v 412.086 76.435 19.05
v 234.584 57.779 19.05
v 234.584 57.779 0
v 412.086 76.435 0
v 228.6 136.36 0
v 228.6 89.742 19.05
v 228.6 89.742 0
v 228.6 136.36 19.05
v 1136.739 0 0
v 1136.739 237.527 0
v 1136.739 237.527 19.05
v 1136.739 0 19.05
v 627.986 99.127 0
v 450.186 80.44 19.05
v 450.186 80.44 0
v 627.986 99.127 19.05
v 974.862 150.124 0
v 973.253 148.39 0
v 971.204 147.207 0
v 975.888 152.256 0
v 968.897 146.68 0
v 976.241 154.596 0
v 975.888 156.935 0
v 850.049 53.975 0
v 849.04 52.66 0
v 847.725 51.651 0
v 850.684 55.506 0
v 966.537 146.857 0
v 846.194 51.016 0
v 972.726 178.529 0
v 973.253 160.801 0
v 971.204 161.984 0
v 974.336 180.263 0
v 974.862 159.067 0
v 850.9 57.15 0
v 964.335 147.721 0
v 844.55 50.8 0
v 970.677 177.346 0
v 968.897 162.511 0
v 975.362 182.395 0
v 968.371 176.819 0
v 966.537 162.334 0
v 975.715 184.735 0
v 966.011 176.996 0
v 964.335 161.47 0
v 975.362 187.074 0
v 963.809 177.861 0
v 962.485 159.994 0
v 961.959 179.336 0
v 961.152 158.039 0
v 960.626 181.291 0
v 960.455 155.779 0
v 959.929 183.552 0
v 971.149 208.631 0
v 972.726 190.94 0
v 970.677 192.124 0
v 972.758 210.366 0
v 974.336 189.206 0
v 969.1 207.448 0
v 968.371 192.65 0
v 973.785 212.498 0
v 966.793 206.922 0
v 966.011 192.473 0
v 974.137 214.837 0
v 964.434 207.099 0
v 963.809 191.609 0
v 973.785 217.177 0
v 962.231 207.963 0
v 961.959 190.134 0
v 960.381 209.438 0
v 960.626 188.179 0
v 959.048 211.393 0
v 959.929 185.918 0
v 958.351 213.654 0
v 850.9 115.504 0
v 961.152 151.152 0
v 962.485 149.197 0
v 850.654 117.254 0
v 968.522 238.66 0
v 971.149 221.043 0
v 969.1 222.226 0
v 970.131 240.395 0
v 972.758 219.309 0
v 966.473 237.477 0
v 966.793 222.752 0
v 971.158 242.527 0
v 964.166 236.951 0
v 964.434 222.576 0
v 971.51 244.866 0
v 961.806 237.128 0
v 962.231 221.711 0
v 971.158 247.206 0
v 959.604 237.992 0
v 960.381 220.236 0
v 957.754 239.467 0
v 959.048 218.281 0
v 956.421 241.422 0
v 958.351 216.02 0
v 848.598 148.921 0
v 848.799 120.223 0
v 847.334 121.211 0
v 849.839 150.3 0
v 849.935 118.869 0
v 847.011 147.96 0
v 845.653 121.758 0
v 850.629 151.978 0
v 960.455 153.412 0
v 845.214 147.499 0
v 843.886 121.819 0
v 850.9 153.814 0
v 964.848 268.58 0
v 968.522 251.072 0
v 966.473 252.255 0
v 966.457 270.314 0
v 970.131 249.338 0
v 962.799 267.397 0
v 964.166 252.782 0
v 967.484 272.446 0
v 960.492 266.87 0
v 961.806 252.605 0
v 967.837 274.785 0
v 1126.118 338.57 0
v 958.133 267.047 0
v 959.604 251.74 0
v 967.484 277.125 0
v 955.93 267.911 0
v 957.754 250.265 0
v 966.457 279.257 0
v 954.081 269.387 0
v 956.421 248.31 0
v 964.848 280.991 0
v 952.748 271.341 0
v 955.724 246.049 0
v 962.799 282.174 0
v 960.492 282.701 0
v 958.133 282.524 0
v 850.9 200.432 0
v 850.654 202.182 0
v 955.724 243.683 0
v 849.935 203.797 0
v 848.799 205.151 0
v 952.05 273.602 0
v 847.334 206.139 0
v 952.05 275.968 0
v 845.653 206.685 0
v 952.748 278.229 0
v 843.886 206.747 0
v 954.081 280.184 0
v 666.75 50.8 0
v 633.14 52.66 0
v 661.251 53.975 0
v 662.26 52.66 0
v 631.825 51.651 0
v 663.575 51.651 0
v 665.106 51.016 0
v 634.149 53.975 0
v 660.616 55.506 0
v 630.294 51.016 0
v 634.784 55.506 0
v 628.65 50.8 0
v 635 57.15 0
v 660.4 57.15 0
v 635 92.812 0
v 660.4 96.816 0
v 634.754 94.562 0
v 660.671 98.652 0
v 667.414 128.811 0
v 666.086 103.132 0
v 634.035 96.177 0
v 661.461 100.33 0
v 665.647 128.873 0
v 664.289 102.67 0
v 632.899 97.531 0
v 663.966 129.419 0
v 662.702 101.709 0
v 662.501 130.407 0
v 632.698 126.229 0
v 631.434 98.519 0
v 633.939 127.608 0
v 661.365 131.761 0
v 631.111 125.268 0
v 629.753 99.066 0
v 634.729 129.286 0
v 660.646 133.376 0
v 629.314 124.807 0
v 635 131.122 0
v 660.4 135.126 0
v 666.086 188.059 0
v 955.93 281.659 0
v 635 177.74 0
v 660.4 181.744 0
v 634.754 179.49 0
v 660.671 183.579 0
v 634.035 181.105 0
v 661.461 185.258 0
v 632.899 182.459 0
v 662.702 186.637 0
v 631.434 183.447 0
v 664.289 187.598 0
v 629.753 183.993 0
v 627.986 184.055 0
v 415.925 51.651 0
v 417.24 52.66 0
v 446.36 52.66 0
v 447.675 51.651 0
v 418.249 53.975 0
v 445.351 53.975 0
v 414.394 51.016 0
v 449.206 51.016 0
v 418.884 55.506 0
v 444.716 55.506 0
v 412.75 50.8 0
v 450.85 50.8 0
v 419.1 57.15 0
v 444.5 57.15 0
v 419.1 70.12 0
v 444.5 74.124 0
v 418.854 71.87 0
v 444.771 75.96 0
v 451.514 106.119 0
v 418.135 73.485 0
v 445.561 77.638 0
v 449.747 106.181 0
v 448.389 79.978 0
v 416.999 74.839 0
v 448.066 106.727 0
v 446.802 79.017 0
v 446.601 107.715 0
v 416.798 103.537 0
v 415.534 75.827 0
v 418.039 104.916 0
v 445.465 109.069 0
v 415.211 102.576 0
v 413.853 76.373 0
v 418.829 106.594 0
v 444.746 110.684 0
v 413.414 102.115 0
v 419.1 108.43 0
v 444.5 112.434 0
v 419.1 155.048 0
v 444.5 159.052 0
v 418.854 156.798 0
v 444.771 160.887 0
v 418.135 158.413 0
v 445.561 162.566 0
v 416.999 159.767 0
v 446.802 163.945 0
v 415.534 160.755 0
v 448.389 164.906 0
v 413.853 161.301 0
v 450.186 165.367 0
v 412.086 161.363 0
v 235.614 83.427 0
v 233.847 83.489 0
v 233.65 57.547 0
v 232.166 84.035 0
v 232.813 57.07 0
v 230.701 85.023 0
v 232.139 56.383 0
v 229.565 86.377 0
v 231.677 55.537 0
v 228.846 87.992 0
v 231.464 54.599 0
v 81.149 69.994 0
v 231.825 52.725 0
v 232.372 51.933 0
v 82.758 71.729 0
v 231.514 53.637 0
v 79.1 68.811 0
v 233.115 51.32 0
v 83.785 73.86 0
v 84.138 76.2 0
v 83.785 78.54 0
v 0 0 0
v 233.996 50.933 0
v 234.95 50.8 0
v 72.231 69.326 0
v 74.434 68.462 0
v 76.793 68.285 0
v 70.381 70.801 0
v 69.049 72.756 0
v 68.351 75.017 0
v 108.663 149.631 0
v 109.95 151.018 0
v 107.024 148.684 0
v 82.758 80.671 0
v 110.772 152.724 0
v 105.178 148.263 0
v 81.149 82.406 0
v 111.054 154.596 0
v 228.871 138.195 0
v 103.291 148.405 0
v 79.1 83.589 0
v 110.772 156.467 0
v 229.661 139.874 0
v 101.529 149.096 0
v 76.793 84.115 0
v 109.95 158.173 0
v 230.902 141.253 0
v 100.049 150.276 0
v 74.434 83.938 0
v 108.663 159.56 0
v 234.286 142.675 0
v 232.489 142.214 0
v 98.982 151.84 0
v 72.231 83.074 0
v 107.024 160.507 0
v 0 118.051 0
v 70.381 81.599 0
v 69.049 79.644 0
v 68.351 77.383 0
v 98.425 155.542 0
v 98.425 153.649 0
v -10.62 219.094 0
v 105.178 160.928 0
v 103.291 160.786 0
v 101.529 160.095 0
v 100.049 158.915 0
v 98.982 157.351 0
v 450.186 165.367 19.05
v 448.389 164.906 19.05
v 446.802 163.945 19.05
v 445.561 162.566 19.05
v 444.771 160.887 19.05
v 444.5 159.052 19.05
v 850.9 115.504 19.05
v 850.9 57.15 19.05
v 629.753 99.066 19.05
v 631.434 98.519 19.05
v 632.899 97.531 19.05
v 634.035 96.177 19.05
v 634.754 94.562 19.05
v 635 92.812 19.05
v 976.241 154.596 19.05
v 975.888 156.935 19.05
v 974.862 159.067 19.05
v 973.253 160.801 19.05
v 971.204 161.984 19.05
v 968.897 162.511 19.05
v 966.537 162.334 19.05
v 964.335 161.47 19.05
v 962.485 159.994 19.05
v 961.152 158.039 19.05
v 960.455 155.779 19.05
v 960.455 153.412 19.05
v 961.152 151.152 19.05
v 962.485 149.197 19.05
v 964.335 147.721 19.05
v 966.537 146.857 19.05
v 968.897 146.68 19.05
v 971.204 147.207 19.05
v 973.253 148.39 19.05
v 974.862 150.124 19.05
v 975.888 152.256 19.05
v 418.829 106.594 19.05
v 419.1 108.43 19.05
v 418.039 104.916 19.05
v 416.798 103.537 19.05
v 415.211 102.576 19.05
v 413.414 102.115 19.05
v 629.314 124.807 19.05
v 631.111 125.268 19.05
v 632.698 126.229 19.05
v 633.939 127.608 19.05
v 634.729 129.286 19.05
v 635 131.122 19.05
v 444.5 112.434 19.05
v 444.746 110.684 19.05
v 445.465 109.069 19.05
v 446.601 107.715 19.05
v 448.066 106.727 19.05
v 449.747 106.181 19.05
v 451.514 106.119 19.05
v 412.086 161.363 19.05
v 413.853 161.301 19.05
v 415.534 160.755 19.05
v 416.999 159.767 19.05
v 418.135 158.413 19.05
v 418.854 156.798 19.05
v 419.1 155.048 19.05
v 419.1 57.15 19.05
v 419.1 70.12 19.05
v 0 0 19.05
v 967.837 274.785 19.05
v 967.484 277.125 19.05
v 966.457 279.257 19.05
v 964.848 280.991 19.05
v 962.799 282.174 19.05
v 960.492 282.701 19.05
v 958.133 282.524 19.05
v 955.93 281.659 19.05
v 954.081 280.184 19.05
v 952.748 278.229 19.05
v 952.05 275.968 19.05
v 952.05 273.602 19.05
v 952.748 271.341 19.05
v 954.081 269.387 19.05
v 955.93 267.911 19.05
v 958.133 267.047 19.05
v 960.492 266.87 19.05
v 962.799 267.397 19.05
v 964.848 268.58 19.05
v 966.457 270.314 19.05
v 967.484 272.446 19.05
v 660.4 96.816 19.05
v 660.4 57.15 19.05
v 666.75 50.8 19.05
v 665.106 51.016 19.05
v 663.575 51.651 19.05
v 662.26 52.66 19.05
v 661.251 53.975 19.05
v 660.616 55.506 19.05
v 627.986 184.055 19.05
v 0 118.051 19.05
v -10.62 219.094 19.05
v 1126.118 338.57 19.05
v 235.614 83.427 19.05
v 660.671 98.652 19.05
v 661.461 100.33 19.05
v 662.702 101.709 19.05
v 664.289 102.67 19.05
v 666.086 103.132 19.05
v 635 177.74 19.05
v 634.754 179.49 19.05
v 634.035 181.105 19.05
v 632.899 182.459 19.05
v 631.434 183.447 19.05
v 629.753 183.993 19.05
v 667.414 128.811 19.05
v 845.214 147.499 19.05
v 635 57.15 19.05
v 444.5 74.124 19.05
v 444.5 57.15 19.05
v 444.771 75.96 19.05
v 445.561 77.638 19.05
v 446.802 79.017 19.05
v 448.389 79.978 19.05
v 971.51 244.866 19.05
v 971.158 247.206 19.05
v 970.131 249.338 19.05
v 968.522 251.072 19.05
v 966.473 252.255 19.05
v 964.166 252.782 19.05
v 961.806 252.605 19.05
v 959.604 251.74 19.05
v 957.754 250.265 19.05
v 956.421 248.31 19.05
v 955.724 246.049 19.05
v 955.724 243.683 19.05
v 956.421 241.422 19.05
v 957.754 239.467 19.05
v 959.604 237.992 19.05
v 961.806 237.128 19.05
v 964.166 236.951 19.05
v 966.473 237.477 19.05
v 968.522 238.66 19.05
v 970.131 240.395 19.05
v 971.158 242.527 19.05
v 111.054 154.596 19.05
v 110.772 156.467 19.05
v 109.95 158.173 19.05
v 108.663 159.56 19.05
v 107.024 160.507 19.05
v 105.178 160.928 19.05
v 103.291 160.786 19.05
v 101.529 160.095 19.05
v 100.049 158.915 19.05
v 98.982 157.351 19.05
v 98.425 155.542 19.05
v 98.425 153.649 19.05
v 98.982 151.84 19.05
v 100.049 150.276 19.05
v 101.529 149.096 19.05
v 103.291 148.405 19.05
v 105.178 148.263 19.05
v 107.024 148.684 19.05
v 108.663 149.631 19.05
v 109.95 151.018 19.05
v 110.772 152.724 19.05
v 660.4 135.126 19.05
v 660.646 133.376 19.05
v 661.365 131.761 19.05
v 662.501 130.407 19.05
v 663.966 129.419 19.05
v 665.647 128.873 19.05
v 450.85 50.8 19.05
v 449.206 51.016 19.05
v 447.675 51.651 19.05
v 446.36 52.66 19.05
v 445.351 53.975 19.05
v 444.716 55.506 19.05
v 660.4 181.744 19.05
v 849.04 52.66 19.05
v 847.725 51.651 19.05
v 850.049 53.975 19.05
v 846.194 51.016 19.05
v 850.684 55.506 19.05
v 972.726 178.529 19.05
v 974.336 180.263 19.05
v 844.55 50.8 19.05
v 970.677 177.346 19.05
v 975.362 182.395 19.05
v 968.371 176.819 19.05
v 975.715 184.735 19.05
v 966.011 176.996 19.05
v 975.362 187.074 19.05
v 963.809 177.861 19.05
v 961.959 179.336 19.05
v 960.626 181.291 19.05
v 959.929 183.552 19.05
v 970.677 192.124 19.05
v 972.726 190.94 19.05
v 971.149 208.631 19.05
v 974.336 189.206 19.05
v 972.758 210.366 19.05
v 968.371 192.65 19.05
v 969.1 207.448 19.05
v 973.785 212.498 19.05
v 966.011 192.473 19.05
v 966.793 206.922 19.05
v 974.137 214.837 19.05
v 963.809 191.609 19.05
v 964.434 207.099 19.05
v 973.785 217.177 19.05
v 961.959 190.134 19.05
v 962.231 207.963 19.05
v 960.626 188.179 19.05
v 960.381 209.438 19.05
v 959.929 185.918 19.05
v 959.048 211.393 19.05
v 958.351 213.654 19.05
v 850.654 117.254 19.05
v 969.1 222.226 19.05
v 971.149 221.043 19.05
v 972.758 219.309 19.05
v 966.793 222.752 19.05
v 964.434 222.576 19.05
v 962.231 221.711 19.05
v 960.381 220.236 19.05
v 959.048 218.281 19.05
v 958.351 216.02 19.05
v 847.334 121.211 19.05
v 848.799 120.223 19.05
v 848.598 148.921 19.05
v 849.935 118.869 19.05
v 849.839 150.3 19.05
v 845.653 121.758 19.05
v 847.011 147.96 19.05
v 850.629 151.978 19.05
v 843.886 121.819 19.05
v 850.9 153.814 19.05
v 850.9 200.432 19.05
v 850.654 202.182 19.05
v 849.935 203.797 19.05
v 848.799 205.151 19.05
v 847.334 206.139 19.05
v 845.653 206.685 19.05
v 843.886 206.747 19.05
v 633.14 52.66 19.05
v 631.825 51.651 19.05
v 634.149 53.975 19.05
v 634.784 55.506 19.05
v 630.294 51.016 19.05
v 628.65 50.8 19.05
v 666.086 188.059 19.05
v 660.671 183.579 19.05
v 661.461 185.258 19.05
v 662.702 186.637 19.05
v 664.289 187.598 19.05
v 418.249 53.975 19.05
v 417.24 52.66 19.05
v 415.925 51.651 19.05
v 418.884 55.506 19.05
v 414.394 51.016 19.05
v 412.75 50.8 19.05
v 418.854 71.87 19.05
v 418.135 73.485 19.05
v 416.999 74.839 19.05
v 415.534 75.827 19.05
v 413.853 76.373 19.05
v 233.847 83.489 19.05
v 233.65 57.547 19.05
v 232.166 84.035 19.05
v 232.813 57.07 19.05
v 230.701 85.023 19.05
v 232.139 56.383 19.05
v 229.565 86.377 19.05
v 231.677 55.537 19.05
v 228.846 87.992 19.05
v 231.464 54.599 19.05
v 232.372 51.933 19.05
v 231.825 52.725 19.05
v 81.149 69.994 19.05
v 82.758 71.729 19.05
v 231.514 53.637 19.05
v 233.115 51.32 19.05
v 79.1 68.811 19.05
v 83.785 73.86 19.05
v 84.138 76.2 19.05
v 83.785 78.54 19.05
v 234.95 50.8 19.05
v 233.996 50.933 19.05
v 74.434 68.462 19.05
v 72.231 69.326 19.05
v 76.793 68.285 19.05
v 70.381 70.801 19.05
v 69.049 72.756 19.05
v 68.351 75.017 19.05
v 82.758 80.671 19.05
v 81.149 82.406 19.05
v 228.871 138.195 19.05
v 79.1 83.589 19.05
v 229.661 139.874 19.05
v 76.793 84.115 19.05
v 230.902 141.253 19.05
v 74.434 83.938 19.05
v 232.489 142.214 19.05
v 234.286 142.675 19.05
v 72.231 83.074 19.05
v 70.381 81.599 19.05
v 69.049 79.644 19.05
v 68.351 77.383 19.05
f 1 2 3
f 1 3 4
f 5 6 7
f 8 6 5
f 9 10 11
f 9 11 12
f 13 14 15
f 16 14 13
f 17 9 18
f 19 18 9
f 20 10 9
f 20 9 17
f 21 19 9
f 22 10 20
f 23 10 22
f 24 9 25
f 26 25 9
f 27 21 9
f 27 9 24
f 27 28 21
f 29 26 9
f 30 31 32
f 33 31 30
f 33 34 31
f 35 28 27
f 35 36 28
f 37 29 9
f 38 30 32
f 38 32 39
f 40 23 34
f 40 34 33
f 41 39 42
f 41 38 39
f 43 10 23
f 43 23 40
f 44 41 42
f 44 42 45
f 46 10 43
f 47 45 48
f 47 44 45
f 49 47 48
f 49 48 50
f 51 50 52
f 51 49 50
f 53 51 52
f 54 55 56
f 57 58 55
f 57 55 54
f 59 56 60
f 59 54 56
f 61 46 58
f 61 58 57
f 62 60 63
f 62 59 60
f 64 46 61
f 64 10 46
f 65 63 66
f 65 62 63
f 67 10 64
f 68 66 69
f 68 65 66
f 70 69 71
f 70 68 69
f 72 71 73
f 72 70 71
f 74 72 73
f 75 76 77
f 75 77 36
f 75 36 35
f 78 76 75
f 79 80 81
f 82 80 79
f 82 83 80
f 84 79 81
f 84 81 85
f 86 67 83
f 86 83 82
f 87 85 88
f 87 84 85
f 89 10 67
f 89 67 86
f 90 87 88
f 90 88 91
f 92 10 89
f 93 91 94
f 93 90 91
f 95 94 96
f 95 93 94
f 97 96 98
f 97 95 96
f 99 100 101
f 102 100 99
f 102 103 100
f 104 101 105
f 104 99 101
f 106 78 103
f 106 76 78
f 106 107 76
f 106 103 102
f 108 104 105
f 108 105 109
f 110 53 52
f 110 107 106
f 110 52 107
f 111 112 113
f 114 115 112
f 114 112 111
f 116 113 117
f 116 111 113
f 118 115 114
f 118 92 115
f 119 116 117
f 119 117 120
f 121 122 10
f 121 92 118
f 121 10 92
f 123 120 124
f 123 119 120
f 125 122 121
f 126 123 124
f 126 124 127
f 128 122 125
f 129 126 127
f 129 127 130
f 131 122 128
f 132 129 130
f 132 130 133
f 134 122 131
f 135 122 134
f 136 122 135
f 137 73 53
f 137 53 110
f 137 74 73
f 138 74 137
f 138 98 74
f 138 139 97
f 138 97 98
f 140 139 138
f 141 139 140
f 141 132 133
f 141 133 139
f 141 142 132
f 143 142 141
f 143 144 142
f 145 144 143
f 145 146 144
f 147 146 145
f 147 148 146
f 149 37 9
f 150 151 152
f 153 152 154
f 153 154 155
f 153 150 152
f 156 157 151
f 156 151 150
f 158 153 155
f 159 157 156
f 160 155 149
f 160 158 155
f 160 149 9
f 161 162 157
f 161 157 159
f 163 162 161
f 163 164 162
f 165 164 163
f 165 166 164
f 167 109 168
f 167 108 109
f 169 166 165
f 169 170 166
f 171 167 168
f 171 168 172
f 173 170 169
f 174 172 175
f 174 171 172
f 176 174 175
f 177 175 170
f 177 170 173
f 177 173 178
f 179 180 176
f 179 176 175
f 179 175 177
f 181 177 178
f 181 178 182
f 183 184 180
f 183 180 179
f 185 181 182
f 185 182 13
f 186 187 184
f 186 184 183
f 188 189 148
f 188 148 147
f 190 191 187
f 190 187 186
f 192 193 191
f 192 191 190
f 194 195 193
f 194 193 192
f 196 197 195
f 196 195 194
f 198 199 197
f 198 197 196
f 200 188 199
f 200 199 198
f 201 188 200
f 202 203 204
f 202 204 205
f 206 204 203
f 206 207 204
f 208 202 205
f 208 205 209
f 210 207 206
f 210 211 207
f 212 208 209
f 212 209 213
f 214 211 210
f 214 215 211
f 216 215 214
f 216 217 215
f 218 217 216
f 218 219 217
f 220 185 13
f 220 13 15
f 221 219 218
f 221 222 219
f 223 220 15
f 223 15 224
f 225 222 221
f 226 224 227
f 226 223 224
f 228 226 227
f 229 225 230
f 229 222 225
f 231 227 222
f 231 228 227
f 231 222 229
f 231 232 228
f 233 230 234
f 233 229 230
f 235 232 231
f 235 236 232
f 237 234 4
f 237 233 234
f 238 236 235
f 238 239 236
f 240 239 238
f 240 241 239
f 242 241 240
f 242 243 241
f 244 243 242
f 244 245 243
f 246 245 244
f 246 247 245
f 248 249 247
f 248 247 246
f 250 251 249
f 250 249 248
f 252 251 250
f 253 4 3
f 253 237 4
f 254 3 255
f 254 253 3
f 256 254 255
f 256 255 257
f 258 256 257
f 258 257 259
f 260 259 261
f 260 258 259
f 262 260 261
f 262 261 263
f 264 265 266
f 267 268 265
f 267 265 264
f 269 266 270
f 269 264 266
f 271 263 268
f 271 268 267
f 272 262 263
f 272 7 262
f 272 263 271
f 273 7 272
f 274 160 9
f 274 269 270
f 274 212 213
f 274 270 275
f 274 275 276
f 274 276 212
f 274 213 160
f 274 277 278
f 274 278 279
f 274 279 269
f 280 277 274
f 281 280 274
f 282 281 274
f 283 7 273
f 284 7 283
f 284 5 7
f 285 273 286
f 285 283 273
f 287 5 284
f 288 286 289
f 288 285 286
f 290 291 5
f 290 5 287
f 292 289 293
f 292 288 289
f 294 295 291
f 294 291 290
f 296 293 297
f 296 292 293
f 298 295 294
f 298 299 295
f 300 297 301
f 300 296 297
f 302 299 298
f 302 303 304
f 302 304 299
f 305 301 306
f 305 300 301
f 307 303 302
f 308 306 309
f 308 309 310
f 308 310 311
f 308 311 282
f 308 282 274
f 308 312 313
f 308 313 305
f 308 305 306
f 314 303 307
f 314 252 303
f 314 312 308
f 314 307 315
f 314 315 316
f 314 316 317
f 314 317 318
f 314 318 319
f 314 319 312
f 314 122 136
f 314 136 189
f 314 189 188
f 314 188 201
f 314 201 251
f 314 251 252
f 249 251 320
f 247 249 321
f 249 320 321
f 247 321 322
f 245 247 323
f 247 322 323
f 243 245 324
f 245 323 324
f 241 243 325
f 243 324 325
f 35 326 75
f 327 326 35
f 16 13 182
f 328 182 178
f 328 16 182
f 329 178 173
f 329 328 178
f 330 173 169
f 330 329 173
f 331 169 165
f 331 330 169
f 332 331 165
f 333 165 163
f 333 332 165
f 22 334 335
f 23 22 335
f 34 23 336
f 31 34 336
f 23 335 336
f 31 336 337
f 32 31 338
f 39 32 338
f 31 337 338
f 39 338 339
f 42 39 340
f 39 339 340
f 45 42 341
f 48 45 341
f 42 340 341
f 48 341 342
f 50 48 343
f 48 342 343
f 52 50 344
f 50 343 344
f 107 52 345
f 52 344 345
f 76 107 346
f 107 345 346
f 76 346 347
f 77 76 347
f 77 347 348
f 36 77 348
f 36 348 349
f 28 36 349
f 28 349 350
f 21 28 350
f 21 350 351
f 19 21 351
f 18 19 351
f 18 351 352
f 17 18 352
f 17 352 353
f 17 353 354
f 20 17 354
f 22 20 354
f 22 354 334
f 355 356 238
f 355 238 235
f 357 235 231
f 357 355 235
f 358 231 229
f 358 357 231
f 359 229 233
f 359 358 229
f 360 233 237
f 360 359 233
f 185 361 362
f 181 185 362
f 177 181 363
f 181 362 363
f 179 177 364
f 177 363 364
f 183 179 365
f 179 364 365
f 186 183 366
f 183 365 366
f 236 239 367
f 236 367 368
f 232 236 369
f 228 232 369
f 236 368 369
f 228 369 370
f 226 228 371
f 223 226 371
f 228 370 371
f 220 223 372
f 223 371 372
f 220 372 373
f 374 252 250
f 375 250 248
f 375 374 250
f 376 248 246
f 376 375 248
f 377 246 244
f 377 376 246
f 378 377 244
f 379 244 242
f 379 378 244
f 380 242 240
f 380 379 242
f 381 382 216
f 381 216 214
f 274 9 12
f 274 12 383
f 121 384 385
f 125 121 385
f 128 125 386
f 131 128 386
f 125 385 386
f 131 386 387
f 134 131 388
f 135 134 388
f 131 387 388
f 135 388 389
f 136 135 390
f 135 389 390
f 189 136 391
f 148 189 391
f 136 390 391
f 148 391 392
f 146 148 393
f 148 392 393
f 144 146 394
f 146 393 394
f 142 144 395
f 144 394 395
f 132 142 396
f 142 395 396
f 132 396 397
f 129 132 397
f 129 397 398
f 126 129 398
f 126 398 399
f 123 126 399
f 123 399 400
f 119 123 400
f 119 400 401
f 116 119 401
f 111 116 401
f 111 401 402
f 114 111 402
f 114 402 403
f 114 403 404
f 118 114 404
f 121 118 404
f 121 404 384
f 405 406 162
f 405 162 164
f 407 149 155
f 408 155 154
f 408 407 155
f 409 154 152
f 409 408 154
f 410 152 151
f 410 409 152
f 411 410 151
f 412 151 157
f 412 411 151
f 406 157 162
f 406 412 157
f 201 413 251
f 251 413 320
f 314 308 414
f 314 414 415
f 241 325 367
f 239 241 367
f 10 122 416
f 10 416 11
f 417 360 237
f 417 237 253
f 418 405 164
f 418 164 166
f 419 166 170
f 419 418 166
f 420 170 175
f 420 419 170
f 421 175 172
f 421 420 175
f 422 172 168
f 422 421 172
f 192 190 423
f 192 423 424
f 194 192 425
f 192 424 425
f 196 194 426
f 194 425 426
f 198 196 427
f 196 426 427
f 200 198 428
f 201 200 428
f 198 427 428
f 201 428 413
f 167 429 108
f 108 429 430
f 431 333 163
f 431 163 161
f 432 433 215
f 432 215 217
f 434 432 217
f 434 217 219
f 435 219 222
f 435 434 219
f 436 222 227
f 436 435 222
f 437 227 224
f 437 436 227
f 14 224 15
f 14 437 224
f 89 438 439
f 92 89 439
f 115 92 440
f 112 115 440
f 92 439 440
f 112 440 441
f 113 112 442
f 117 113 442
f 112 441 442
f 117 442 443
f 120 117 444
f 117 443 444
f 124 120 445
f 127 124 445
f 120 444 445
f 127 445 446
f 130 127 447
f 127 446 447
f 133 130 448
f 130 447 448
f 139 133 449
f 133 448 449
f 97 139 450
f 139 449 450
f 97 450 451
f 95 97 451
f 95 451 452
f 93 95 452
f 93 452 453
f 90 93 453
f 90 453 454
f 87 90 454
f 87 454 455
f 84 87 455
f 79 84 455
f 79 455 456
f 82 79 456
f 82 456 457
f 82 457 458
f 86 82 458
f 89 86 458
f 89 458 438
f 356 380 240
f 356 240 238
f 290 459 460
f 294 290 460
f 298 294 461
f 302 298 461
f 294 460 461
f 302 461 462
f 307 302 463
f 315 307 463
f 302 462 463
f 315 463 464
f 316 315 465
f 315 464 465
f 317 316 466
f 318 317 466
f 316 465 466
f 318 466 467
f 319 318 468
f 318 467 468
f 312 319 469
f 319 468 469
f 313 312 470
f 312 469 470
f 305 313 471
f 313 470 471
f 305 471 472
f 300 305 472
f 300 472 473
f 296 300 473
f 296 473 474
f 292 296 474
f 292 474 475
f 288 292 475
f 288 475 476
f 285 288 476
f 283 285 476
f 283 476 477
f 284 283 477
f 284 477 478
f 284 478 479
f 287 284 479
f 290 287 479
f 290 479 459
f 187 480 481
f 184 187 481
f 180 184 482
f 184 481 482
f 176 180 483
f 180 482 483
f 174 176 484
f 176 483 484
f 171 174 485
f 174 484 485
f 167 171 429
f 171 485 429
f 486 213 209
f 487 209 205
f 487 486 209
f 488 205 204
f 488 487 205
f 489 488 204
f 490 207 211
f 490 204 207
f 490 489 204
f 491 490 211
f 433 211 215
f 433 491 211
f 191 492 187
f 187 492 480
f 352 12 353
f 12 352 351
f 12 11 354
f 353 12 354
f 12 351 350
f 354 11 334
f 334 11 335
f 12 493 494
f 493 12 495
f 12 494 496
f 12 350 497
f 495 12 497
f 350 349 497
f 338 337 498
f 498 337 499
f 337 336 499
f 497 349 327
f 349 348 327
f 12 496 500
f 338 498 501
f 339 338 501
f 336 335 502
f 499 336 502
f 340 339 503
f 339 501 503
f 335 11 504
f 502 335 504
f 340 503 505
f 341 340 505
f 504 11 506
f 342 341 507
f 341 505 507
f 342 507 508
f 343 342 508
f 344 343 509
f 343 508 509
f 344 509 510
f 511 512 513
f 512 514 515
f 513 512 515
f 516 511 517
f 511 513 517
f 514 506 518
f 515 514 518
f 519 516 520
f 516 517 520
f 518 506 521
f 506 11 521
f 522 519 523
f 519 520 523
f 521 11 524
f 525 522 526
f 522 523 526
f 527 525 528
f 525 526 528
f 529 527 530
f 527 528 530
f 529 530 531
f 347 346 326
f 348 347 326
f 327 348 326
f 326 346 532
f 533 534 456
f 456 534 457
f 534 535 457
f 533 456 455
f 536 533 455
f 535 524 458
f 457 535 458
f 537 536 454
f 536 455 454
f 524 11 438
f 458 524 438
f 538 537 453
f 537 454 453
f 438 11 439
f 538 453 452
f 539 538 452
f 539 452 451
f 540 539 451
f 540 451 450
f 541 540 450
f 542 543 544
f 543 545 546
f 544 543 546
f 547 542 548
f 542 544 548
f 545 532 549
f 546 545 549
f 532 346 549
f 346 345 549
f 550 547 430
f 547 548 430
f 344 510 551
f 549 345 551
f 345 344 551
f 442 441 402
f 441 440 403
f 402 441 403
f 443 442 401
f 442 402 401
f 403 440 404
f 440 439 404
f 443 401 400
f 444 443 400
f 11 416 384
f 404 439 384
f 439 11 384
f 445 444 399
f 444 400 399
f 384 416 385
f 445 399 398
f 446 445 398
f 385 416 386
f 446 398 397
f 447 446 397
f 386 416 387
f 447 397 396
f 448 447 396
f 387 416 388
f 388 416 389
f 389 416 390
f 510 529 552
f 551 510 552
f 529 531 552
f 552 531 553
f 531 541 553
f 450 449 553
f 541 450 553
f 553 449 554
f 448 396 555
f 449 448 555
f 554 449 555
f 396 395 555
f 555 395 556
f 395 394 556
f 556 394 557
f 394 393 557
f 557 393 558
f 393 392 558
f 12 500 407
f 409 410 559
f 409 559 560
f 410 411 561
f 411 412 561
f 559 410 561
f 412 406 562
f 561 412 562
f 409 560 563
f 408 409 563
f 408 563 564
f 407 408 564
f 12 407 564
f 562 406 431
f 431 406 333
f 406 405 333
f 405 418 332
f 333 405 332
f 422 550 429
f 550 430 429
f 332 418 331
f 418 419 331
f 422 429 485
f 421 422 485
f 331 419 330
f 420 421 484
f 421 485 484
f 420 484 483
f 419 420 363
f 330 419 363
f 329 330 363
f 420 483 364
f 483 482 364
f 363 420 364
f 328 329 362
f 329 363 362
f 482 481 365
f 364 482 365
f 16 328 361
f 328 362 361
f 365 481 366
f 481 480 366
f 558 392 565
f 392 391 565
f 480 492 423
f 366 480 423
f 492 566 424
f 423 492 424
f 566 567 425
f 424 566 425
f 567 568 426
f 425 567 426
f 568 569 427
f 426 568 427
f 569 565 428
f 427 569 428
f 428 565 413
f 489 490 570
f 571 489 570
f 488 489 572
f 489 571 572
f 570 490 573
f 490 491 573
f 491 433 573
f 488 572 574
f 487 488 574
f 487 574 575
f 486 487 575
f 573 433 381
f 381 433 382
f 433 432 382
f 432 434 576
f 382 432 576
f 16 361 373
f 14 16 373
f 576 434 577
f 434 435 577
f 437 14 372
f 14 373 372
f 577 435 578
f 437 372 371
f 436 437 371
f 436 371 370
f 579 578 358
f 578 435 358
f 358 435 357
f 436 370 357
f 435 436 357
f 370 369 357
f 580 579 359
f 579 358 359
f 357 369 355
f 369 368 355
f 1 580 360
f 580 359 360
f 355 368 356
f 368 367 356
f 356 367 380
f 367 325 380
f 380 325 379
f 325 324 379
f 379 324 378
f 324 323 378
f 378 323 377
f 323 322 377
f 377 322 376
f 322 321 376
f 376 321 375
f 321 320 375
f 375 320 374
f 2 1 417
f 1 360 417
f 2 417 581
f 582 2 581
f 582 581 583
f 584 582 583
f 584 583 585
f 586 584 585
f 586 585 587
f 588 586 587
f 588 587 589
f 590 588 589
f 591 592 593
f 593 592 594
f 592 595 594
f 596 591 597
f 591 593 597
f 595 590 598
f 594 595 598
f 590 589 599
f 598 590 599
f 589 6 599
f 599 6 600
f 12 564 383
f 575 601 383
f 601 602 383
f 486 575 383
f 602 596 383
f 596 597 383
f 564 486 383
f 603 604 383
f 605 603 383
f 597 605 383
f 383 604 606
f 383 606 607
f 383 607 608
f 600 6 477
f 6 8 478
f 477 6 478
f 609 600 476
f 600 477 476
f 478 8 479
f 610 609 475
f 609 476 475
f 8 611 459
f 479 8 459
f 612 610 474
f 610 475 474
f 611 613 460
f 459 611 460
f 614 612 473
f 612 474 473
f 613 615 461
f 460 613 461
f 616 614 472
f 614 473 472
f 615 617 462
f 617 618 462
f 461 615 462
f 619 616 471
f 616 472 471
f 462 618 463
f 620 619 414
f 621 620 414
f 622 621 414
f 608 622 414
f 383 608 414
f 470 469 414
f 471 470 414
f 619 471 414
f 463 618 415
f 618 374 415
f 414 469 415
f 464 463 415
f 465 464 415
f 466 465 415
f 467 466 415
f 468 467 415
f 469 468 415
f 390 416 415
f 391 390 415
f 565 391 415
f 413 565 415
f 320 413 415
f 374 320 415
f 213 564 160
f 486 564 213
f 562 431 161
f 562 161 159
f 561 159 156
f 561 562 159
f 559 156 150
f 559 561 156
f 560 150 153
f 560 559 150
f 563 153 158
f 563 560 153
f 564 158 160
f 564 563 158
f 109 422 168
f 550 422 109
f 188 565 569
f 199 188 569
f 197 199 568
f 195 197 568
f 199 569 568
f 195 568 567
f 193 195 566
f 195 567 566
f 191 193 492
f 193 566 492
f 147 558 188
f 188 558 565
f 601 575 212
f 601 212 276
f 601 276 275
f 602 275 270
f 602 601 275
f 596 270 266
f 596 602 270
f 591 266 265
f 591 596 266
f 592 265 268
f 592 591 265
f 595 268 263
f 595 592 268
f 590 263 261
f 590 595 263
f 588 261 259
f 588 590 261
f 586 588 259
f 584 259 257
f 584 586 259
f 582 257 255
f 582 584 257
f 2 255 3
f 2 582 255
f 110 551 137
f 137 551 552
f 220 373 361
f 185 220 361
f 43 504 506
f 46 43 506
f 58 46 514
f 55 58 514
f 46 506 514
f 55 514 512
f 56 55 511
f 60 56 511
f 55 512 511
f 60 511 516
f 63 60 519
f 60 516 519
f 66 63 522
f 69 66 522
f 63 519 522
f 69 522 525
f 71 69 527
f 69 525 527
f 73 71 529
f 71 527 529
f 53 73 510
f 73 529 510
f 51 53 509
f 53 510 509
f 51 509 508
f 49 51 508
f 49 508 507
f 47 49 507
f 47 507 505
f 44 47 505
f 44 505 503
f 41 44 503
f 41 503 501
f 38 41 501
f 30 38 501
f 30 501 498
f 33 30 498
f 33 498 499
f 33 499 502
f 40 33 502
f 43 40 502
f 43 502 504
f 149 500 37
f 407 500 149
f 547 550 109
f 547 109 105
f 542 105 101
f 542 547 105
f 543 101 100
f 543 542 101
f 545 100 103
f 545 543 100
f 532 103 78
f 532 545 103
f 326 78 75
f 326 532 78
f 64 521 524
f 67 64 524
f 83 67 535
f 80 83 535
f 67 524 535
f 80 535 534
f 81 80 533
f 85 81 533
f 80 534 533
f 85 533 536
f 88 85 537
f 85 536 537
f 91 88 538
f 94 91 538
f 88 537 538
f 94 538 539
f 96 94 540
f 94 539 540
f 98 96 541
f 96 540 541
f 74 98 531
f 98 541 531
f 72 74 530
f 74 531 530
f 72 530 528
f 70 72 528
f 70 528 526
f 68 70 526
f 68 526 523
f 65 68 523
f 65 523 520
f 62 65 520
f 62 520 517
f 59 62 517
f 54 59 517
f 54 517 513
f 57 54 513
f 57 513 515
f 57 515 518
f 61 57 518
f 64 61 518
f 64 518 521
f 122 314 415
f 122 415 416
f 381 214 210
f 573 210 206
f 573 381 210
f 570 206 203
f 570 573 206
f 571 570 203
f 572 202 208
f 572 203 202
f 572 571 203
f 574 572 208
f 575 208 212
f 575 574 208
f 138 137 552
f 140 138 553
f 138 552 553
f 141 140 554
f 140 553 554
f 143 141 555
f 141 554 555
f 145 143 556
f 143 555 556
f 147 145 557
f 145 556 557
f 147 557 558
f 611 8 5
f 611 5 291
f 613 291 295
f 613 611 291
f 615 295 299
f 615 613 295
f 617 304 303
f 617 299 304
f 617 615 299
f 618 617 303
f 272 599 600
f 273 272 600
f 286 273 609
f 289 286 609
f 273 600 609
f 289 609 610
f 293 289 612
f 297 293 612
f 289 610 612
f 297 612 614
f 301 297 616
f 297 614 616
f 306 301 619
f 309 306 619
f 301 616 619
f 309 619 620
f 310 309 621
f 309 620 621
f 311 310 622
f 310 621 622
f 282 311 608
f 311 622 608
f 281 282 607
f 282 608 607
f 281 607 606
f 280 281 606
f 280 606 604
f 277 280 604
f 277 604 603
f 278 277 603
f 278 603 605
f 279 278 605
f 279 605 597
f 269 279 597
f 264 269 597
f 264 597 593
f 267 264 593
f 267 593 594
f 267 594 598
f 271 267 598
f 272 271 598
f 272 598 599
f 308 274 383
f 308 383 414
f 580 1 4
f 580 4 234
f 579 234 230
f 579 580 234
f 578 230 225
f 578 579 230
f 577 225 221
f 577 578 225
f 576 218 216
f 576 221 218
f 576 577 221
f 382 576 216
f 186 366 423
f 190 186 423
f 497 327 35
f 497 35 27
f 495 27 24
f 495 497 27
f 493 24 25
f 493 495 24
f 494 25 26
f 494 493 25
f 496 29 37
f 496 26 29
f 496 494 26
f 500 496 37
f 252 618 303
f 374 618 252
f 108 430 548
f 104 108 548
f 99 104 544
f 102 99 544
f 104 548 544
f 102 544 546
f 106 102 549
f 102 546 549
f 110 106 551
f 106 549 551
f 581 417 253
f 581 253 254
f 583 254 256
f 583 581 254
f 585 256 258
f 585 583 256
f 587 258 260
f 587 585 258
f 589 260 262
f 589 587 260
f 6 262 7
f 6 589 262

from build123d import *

# Parameters (mm, degrees)
BOSS_EXTRUDE1_DEPTH = 19.05
SKETCH8_R           = 6.35
CUT_EXTRUDE3_DEPTH  = 1187.240784438
SKETCH10_R          = 7.9375
CUT_EXTRUDE5_DEPTH  = 1187.240784438
CUT_EXTRUDE6_DEPTH  = 1187.240784438
SKETCH13_R          = 7.9375
CUT_EXTRUDE7_DEPTH  = 1187.240784438


with BuildPart() as part:
    # Sketch1 → Boss-Extrude1 (new body)
    with BuildSketch(Plane.XY):
        Polygon((-10.620091868, 219.094223225), (1126.118434538, 338.57025674), (1136.738526406, 237.526832171), (1136.738526406, 0), (0, 0), (0, 118.050798656), align=None)
    extrude(amount=BOSS_EXTRUDE1_DEPTH)

    # Sketch8 → Cut-Extrude3 (cut, through all)
    with BuildSketch(Plane.XY.offset(19.05)):
        with Locations((104.703615638, 154.595502408)):
            Circle(SKETCH8_R)
    extrude(amount=-CUT_EXTRUDE3_DEPTH, mode=Mode.SUBTRACT)

    # Sketch10 → Cut-Extrude5 (cut, through all)
    with BuildSketch(Plane.XY.offset(19.05)):
        with Locations((963.572724478, 244.866283286)):
            Circle(SKETCH10_R)
        with Locations((966.199929442, 214.837193133)):
            Circle(SKETCH10_R)
        with Locations((967.777533852, 184.73470776)):
            Circle(SKETCH10_R)
        with Locations((968.303615638, 154.595502408)):
            Circle(SKETCH10_R)
        with Locations((959.899119803, 274.785392397)):
            Circle(SKETCH10_R)
    extrude(amount=-CUT_EXTRUDE5_DEPTH, mode=Mode.SUBTRACT)

    # Sketch12 → Cut-Extrude6 (cut, through all)
    with BuildSketch(Plane.XY.offset(19.05)):
        with BuildLine():
            Line((844.55, 50.8), (666.75, 50.8))
            ThreePointArc((666.75, 50.8), (662.259871939, 52.659871939), (660.4, 57.15))
            Line((660.4, 57.15), (660.4, 96.816443106))
            ThreePointArc((660.4, 96.816443106), (662.031030358, 101.065422457), (666.086244258, 103.131657142))
            Line((666.086244258, 103.131657142), (843.886244258, 121.819190172))
            ThreePointArc((843.886244258, 121.819190172), (848.79897935, 120.222945778), (850.9, 115.503976137))
            Line((850.9, 115.503976137), (850.9, 57.15))
            ThreePointArc((850.9, 57.15), (849.040128061, 52.659871939), (844.55, 50.8))
        make_face()
        with BuildLine():
            Line((444.5, 57.15), (444.5, 74.124438713))
            ThreePointArc((444.5, 74.124438713), (446.131030358, 78.373418063), (450.186244258, 80.439652748))
            Line((450.186244258, 80.439652748), (627.986244258, 99.127185778))
            ThreePointArc((627.986244258, 99.127185778), (632.89897935, 97.530941385), (635, 92.811971743))
            Line((635, 92.811971743), (635, 57.15))
            ThreePointArc((635, 57.15), (633.140128061, 52.659871939), (628.65, 50.8))
            Line((628.65, 50.8), (450.85, 50.8))
            ThreePointArc((450.85, 50.8), (446.359871939, 52.659871939), (444.5, 57.15))
        make_face()
        with BuildLine():
            Line((843.886244258, 206.74681701), (666.086244258, 188.05928398))
            ThreePointArc((666.086244258, 188.05928398), (662.031030358, 185.993049294), (660.4, 181.744069944))
            Line((660.4, 181.744069944), (660.4, 135.126308558))
            ThreePointArc((660.4, 135.126308558), (662.50102065, 130.407338916), (667.413755742, 128.811094522))
            Line((667.413755742, 128.811094522), (845.213755742, 147.498627552))
            ThreePointArc((845.213755742, 147.498627552), (849.268969642, 149.564862238), (850.9, 153.813841588))
            Line((850.9, 153.813841588), (850.9, 200.431602974))
            ThreePointArc((850.9, 200.431602974), (848.79897935, 205.150572616), (843.886244258, 206.74681701))
        make_face()
        with BuildLine():
            Line((627.986244258, 184.054812616), (450.186244258, 165.367279586))
            ThreePointArc((450.186244258, 165.367279586), (446.131030358, 163.301044901), (444.5, 159.05206555))
            Line((444.5, 159.05206555), (444.5, 112.434304164))
            ThreePointArc((444.5, 112.434304164), (446.60102065, 107.715334522), (451.513755742, 106.119090128))
            Line((451.513755742, 106.119090128), (629.313755742, 124.806623159))
            ThreePointArc((629.313755742, 124.806623159), (633.368969642, 126.872857844), (635, 131.121837194))
            Line((635, 131.121837194), (635, 177.73959858))
            ThreePointArc((635, 177.73959858), (632.89897935, 182.458568222), (627.986244258, 184.054812616))
        make_face()
        with BuildLine():
            Line((412.75, 50.8), (234.95, 50.8))
            ThreePointArc((234.95, 50.8), (231.455726331, 54.115941899), (234.584247692, 57.778969777))
            Line((234.584247692, 57.778969777), (412.086244258, 76.435181385))
            ThreePointArc((412.086244258, 76.435181385), (416.99897935, 74.838936991), (419.1, 70.119967349))
            Line((419.1, 70.119967349), (419.1, 57.15))
            ThreePointArc((419.1, 57.15), (417.240128061, 52.659871939), (412.75, 50.8))
        make_face()
        with BuildLine():
            Line((234.286244258, 142.675275192), (412.086244258, 161.362808222))
            ThreePointArc((412.086244258, 161.362808222), (416.99897935, 159.766563828), (419.1, 155.047594187))
            Line((419.1, 155.047594187), (419.1, 108.4298328))
            ThreePointArc((419.1, 108.4298328), (417.468969642, 104.18085345), (413.413755742, 102.114618765))
            Line((413.413755742, 102.114618765), (235.613755742, 83.427085734))
            ThreePointArc((235.613755742, 83.427085734), (230.70102065, 85.023330128), (228.6, 89.74229977))
            Line((228.6, 89.74229977), (228.6, 136.360061156))
            ThreePointArc((228.6, 136.360061156), (230.231030358, 140.609040507), (234.286244258, 142.675275192))
        make_face()
    extrude(amount=-CUT_EXTRUDE6_DEPTH, mode=Mode.SUBTRACT)

    # Sketch13 → Cut-Extrude7 (cut, through all)
    with BuildSketch(Plane.XY.offset(19.05)):
        with Locations((76.2, 76.2)):
            Circle(SKETCH13_R)
    extrude(amount=-CUT_EXTRUDE7_DEPTH, mode=Mode.SUBTRACT)


solid = part.part
